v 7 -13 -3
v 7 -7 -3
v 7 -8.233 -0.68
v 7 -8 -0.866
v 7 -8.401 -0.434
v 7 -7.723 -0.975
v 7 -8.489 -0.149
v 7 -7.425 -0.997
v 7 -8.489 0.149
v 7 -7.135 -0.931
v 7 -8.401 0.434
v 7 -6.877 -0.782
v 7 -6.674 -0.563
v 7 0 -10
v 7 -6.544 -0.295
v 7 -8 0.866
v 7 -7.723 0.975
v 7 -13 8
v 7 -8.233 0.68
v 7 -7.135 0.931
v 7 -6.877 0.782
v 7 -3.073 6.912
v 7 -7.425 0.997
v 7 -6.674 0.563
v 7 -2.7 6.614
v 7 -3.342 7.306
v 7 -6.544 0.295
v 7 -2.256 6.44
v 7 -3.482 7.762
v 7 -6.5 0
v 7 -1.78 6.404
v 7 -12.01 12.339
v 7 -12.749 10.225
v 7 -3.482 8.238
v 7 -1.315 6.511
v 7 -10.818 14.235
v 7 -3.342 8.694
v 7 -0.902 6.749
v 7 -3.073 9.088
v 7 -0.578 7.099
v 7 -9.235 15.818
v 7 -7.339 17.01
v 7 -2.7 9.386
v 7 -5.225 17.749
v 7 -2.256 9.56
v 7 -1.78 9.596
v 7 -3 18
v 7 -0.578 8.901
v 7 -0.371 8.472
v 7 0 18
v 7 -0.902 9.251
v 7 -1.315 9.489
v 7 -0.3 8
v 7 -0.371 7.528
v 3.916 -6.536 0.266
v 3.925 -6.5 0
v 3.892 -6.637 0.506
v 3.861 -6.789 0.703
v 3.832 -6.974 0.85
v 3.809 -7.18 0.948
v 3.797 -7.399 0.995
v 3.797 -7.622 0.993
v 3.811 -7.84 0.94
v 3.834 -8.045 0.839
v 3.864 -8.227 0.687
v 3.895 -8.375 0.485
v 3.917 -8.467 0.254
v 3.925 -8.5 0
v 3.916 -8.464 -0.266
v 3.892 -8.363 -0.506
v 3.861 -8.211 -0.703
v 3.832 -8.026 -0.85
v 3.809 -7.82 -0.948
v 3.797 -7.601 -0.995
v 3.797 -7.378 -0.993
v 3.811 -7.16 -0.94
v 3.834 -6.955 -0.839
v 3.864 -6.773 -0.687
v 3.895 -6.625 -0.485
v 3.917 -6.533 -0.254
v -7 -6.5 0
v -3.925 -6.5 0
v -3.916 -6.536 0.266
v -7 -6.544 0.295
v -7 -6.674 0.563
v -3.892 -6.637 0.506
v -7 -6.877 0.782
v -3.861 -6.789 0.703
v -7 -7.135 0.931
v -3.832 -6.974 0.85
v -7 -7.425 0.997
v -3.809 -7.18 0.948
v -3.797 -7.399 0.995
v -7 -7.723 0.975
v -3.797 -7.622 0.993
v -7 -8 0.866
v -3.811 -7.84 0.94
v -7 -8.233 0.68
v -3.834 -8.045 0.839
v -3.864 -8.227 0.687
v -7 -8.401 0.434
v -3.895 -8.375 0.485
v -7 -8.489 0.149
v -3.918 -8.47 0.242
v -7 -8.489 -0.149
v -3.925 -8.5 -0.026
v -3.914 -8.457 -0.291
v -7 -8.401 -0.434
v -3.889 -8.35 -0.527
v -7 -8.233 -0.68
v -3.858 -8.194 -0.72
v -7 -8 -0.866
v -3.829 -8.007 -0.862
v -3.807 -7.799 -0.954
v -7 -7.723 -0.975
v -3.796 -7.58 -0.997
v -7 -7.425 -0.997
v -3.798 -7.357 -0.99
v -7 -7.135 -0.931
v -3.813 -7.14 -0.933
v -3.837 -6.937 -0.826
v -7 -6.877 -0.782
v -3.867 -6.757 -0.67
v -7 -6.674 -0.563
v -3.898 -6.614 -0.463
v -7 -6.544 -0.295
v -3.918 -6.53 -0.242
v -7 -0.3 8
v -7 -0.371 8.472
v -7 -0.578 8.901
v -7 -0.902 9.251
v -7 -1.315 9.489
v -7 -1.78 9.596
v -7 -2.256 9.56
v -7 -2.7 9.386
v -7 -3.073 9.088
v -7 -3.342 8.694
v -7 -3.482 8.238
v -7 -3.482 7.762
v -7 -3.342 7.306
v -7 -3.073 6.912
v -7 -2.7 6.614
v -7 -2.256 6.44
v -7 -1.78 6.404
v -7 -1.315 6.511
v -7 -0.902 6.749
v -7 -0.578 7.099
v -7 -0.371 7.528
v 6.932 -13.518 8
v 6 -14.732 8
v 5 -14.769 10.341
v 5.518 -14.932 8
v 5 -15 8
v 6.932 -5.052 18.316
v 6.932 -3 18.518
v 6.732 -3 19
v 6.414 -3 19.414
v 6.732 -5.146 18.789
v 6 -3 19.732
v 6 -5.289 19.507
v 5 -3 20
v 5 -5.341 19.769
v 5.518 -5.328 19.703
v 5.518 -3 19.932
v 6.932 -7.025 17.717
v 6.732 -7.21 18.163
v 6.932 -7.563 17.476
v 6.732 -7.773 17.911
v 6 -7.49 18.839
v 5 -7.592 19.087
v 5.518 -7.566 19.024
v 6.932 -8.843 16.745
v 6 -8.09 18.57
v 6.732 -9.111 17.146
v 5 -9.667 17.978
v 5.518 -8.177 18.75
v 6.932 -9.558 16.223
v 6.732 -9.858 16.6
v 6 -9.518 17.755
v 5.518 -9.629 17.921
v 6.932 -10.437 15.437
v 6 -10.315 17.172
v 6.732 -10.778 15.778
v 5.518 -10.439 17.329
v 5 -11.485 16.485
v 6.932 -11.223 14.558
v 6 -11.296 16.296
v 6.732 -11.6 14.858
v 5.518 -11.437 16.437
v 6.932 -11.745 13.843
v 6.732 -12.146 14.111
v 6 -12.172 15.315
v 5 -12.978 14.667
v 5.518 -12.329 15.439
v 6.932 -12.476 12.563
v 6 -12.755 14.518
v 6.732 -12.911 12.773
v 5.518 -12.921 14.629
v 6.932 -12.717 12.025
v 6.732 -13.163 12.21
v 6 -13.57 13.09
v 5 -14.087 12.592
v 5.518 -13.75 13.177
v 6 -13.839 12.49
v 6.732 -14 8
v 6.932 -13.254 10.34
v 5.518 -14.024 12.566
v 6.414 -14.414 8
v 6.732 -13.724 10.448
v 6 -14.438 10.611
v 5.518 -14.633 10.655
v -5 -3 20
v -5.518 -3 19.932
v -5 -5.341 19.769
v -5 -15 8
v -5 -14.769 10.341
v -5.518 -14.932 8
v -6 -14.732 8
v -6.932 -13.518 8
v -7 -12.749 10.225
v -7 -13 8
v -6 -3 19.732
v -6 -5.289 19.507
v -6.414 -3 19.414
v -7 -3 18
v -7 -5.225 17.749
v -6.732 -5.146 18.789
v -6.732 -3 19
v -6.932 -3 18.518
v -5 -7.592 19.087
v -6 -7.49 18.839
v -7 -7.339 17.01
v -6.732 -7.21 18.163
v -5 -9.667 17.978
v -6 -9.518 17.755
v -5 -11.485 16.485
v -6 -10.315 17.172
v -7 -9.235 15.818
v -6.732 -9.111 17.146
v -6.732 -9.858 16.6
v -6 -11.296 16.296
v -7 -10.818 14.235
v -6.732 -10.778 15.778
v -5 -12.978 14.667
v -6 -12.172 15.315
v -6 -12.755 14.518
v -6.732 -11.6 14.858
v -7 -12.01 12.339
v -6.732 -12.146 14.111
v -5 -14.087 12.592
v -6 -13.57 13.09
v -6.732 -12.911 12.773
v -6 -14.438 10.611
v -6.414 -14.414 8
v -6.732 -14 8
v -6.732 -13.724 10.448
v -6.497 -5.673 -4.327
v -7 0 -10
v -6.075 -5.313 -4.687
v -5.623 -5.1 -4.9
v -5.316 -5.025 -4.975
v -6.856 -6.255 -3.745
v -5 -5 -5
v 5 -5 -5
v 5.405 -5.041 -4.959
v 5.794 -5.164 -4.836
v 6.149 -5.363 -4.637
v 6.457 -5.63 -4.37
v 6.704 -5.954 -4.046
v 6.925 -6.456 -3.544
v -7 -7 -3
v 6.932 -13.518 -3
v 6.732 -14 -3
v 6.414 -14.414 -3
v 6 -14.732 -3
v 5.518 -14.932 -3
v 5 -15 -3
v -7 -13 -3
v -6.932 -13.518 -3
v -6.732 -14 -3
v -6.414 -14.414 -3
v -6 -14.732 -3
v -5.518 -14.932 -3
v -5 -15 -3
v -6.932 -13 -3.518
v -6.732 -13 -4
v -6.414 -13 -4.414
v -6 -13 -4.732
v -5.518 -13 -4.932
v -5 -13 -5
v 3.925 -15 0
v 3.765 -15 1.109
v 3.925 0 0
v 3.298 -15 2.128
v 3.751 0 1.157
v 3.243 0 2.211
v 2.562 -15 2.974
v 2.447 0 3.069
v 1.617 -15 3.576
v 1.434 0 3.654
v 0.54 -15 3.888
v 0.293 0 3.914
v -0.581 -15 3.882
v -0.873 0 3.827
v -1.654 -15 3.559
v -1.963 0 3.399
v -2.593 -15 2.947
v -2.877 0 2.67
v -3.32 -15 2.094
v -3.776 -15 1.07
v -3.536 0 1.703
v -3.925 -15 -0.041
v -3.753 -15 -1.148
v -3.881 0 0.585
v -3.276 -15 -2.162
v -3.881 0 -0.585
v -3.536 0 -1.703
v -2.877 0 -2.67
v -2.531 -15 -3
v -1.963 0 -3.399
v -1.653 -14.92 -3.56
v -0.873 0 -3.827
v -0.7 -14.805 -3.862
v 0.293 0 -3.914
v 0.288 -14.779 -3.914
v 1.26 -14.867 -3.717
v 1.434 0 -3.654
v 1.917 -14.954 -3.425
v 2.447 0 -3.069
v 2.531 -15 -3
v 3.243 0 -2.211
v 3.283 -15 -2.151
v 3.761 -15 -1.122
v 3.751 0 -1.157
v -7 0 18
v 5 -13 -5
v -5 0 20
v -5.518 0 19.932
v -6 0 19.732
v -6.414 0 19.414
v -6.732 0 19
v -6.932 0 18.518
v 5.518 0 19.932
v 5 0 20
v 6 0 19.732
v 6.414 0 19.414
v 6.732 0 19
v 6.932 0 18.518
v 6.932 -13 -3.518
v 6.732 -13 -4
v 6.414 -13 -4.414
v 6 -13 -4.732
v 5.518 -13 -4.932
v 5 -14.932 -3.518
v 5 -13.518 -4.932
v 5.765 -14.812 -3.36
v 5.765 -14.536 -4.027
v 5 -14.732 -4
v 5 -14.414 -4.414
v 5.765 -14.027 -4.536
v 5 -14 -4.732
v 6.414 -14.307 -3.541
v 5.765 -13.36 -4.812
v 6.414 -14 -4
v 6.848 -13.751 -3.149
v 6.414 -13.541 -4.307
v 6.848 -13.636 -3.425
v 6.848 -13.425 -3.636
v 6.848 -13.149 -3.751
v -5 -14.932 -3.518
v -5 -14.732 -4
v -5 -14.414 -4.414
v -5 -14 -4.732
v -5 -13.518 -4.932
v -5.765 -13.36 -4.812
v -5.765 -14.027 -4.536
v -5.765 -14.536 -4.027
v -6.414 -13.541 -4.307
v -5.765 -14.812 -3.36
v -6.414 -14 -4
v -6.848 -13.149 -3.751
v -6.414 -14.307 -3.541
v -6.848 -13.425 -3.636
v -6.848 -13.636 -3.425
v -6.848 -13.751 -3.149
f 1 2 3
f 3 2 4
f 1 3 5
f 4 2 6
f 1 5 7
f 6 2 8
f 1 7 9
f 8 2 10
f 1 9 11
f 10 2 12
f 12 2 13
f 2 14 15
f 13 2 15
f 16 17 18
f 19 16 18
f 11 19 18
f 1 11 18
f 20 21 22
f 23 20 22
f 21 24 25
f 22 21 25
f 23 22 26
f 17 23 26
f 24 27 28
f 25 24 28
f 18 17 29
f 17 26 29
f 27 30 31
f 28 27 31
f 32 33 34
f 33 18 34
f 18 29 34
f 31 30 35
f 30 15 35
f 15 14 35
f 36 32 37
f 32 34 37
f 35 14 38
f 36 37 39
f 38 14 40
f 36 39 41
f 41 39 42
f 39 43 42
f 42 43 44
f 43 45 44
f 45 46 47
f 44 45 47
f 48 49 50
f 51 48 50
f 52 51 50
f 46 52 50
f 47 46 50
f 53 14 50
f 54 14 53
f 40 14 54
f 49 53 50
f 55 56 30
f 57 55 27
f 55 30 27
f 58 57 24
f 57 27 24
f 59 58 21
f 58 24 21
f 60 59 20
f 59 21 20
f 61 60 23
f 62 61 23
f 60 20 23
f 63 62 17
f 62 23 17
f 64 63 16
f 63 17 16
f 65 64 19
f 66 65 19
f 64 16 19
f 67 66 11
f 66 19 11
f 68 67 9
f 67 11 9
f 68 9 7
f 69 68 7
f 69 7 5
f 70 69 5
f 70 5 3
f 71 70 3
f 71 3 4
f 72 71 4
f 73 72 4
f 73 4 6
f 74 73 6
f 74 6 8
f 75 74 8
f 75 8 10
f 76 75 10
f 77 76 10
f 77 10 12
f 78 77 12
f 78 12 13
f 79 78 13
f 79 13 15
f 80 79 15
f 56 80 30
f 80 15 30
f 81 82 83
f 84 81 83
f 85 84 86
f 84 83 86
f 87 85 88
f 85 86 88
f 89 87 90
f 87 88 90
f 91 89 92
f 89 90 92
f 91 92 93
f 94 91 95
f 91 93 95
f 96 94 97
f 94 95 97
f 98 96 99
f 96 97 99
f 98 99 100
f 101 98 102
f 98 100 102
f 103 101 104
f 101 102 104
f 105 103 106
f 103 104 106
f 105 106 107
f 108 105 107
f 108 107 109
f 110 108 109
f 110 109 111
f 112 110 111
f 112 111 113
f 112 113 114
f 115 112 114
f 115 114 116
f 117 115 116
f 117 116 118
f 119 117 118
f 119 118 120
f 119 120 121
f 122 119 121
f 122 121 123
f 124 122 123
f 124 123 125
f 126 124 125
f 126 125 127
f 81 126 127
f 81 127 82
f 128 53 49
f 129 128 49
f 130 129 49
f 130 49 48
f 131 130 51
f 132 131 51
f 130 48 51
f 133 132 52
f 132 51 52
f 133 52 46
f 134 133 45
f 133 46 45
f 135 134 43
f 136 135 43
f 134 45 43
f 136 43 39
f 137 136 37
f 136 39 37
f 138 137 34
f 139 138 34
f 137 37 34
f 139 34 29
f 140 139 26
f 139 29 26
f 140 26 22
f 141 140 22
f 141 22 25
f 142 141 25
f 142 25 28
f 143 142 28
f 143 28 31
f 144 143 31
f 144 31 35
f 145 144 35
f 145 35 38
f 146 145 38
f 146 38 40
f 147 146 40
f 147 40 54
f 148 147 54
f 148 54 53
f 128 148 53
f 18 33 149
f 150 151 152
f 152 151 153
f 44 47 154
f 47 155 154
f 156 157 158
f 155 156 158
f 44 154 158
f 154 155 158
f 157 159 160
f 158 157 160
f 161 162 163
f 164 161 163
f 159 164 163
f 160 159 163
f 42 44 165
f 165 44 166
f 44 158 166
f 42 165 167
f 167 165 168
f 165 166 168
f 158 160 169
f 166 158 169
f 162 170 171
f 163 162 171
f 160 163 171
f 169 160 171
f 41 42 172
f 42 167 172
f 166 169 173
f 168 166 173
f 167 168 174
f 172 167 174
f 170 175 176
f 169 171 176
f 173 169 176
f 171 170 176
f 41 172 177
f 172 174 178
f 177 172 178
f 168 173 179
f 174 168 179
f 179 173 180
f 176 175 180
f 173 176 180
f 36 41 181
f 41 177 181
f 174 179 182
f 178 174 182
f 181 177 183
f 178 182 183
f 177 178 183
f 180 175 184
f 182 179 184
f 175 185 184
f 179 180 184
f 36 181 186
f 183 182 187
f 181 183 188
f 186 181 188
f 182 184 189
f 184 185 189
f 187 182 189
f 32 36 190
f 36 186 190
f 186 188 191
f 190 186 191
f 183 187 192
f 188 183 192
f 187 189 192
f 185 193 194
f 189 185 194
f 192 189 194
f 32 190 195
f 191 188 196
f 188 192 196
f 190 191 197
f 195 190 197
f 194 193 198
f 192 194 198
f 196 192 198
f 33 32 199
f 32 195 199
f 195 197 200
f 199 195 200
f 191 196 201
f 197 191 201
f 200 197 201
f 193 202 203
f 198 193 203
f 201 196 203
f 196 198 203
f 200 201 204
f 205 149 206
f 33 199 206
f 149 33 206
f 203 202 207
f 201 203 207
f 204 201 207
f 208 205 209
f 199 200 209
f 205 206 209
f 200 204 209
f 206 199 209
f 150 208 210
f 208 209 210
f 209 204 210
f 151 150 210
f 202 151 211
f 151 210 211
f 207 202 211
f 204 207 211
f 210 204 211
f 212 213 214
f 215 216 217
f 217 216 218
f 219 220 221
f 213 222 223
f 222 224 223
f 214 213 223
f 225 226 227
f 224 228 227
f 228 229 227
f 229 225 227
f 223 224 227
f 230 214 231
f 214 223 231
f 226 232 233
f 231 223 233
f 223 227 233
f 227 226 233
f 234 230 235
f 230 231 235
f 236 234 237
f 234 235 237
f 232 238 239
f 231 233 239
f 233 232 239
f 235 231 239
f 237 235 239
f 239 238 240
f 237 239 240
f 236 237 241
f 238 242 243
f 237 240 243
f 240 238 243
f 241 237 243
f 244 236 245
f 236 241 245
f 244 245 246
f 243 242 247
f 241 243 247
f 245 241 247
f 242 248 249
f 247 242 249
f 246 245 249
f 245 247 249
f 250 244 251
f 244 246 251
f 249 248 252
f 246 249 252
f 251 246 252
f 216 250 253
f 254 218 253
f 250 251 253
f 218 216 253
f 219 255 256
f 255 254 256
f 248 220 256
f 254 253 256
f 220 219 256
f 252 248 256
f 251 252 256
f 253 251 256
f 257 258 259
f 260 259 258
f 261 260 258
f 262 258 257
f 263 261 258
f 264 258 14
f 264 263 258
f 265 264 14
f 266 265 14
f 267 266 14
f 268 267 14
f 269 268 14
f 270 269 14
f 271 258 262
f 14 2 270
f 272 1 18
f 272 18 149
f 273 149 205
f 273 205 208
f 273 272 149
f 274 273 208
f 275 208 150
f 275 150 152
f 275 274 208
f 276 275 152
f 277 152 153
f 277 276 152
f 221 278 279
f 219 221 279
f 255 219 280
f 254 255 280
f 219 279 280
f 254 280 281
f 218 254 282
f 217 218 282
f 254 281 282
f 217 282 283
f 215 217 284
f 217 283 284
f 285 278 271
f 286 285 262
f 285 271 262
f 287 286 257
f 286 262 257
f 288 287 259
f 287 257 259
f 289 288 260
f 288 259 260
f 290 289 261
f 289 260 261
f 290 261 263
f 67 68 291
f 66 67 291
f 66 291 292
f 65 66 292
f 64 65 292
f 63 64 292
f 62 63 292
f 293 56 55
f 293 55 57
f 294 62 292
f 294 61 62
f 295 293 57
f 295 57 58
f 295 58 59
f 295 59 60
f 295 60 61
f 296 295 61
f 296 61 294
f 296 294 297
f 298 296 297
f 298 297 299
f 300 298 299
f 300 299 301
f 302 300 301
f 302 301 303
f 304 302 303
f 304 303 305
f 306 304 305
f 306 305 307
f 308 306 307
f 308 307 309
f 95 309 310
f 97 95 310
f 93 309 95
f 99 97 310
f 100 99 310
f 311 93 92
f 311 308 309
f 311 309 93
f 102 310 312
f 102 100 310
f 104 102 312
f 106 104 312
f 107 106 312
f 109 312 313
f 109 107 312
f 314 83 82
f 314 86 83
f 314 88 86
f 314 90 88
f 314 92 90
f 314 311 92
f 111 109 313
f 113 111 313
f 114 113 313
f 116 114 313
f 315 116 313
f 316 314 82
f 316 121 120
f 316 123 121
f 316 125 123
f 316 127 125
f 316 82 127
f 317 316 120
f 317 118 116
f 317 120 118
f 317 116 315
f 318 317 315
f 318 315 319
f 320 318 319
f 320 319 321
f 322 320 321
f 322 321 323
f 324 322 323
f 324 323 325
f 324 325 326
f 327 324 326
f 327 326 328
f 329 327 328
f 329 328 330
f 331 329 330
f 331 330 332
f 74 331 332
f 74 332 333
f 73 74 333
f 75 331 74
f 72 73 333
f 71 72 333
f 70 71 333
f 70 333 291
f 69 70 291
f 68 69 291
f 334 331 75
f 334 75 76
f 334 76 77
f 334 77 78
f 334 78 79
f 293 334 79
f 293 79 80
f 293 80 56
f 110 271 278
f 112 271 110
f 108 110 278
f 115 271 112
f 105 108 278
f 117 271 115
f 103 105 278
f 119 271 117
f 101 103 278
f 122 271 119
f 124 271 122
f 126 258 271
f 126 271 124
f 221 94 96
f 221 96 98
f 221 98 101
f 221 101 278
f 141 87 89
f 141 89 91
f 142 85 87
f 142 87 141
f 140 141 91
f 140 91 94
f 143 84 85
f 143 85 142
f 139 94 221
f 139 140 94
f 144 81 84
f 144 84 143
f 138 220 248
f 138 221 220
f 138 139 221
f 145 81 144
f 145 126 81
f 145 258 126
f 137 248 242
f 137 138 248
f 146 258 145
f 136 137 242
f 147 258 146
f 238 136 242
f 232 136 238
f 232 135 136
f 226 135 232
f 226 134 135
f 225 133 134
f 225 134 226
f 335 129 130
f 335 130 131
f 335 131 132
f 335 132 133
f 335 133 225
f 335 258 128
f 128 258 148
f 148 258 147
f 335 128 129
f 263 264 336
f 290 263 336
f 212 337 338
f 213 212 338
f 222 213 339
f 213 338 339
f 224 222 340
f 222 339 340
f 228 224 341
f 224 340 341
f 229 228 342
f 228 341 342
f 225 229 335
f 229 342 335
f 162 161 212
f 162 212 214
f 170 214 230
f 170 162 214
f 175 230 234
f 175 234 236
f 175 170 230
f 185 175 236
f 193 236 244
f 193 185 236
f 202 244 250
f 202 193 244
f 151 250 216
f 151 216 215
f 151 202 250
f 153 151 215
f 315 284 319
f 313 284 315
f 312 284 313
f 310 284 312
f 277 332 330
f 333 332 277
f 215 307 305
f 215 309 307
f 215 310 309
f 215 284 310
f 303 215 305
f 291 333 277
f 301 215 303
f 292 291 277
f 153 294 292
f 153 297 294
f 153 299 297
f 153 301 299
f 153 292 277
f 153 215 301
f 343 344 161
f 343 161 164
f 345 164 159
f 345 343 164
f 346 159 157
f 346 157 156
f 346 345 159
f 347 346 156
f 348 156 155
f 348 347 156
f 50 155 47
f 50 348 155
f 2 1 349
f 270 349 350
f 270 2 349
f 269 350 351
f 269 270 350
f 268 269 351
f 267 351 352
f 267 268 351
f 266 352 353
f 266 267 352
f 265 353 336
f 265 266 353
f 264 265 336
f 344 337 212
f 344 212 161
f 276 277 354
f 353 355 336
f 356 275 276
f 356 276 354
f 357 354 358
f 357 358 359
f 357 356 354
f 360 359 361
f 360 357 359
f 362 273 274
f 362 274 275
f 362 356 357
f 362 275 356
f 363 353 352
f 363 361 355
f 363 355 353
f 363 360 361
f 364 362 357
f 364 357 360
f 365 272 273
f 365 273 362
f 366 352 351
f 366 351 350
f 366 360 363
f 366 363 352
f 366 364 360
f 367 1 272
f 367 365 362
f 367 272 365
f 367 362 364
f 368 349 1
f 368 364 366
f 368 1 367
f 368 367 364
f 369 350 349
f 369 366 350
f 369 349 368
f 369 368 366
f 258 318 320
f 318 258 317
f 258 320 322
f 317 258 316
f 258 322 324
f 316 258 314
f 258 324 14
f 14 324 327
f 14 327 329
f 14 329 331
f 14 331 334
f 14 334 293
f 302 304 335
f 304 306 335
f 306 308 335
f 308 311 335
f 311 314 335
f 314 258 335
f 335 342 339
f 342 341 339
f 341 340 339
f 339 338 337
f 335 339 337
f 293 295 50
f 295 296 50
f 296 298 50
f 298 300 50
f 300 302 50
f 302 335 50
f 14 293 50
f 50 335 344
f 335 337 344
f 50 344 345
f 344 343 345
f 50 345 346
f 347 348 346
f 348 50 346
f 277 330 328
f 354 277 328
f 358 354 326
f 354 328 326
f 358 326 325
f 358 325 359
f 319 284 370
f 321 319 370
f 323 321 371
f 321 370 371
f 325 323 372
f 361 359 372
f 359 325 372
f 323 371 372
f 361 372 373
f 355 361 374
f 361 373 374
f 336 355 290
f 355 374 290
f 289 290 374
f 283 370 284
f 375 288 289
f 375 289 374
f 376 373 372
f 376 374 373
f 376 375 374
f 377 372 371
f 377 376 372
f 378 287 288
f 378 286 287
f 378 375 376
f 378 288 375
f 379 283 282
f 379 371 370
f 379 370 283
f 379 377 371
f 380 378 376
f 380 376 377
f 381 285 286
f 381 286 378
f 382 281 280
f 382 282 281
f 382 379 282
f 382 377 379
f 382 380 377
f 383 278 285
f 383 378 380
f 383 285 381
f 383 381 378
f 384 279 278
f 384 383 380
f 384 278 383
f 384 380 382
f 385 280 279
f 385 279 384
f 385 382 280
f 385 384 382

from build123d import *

# Parameters (mm, degrees)
F0_W         = 14
F0_H         = 30
F0_R         = 3.925
F1_DEPTH     = 15
F3_DEPTH     = 14.001
F4_R         = 1.6
F4_R_2       = 1
F5_DEPTH     = 14.001
F6_R         = 12
F7_T1_DEPTH  = 10
F7_T3_DEPTH  = 11
F7_T5_DEPTH  = 8
F7_S9_W      = 2
F7_S9_H      = 2
F7_T10_DEPTH = 2
F7_S15_W     = 2
F7_S15_H     = 2
F7_T16_DEPTH = 2
F7_T22_DEPTH = 13
F7_T25_ANGLE = 90
F7_T29_DEPTH = 13
F7_T32_ANGLE = 90


# Not quite as in the source:
# - a fillet or chamfer that OpenCascade refuses, or shapes differently, is made with other operations: its cross-section is extruded or revolved along the edge and cut away or added


with BuildPart() as f1:
    # F0 (on Front) → F1 (new body)
    with BuildSketch(Plane.XZ):
        with Locations((0, 5)):
            Rectangle(F0_W, F0_H)
        Circle(F0_R, mode=Mode.SUBTRACT)
    extrude(amount=F1_DEPTH)

    # F2 (on face) → F3 (cut, through all)
    with BuildSketch(Plane.YZ.offset(7)):
        Polygon((-15, -10), (0, -10), (-5, -5), (-15, -5), align=None)
    extrude(amount=-F3_DEPTH, mode=Mode.SUBTRACT)

    # F4 (on face) → F5 (cut, through all)
    with BuildSketch(Plane.YZ.offset(7)):
        with Locations((-1.9, 8)):
            Circle(F4_R)
        with Locations((-7.5, 0)):
            Circle(F4_R_2)
    extrude(amount=-F5_DEPTH, mode=Mode.SUBTRACT)

    # F6
    f6_edges = [f1.edges().sort_by_distance(p)[0] for p in [
        (0, -15, 20),
    ]]
    fillet(f6_edges, radius=F6_R)

    # F7: fillet of radius 2 on 9 edges, made by hand

    # F7_s2 → F7_t1 (cut)
    with BuildSketch(Plane.YZ.offset(-5)):
        with BuildLine():
            ThreePointArc((-15, -3), (-14.4142135624, -4.4142135624), (-13, -5))
            Line((-13, -5), (-15, -5))
            Line((-15, -5), (-15, -3))
        make_face()
    extrude(amount=F7_T1_DEPTH, mode=Mode.SUBTRACT)

    # F7_s4 → F7_t3 (cut)
    with BuildSketch(Plane.XY.offset(-3)):
        with BuildLine():
            ThreePointArc((7, -13), (6.4142135624, -14.4142135624), (5, -15))
            Line((5, -15), (7, -15))
            Line((7, -15), (7, -13))
        make_face()
        with BuildLine():
            ThreePointArc((-7, -13), (-6.4142135624, -14.4142135624), (-5, -15))
            Line((-5, -15), (-7, -15))
            Line((-7, -15), (-7, -13))
        make_face()
    extrude(amount=F7_T3_DEPTH, mode=Mode.SUBTRACT)

    # F7_s6 → F7_t5 (cut)
    with BuildSketch(Plane.XZ.offset(-5)):
        with BuildLine():
            ThreePointArc((5, 20), (6.4142135624, 19.4142135624), (7, 18))
            Line((7, 18), (7, 20))
            Line((7, 20), (5, 20))
        make_face()
        with BuildLine():
            ThreePointArc((-5, 20), (-6.4142135624, 19.4142135624), (-7, 18))
            Line((-7, 18), (-7, 20))
            Line((-7, 20), (-5, 20))
        make_face()
    extrude(amount=F7_T5_DEPTH, mode=Mode.SUBTRACT)


with BuildPart() as f7_tool8:
    # F7_s9 → F7_t10 (new body)
    with BuildSketch(Plane.YZ.offset(5)):
        with Locations((-14, -4)):
            Rectangle(F7_S9_W, F7_S9_H)
    extrude(amount=F7_T10_DEPTH)

    # F7_s11 → F7_t12 (revolve, cut)
    with BuildSketch(Plane(origin=(5, -13, -3), x_dir=(0, 0.7071067812, 0.7071067812), z_dir=(0, 0.7071067812, -0.7071067812))):
        with BuildLine():
            ThreePointArc((0, -2), (2, 0), (0, 2))
            Line((0, 2), (0, -2))
        make_face()
    revolve(axis=Axis((5, -13, -3), (1, 0, 0)), mode=Mode.SUBTRACT)


with BuildPart() as f1_1:
    add(f1.part)

    # F7_t7: cut F7_tool8
    add(f7_tool8.part, mode=Mode.SUBTRACT)


with BuildPart() as f7_tool14:
    # F7_s15 → F7_t16 (new body)
    with BuildSketch(Plane.YZ.offset(-5)):
        with Locations((-14, -4)):
            Rectangle(F7_S15_W, F7_S15_H)
    extrude(amount=-F7_T16_DEPTH)

    # F7_s17 → F7_t18 (revolve, cut)
    with BuildSketch(Plane(origin=(-5, -13, -3), x_dir=(0, 0.7071067812, 0.7071067812), z_dir=(0, -0.7071067812, 0.7071067812))):
        with BuildLine():
            ThreePointArc((0, -2), (2, 0), (0, 2))
            Line((0, 2), (0, -2))
        make_face()
    revolve(axis=Axis((-5, -13, -3), (-1, 0, 0)), mode=Mode.SUBTRACT)


with BuildPart() as f1_2:
    add(f1_1.part)

    # F7_t13: cut F7_tool14
    add(f7_tool14.part, mode=Mode.SUBTRACT)


with BuildPart() as f7_tool20:
    # F7_s21 → F7_t22 (new body)
    with BuildSketch(Plane.XZ):
        with BuildLine():
            ThreePointArc((-7, -3), (-6.4142135624, -4.4142135624), (-5, -5))
            Line((-5, -5), (-7, -5))
            Line((-7, -5), (-7, -3))
        make_face()
    extrude(amount=F7_T22_DEPTH)

    split(bisect_by=Plane(origin=(0, -5, -5), x_dir=(1, 0, 0), z_dir=(0, -0.7071067812, -0.7071067812)), keep=Keep.TOP)


with BuildPart() as f1_3:
    add(f1_2.part)

    # F7_t19: cut F7_tool20
    add(f7_tool20.part, mode=Mode.SUBTRACT)

    # F7_s24 → F7_t25 (revolve, cut)
    with BuildSketch(Plane.XZ.offset(3)):
        with BuildLine():
            ThreePointArc((-5, 20), (-6.4142135624, 19.4142135624), (-7, 18))
            Line((-7, 18), (-7, 20))
            Line((-7, 20), (-5, 20))
        make_face()
    revolve(axis=Axis((-7, -3, 8), (1, 0, 0)), revolution_arc=F7_T25_ANGLE, mode=Mode.SUBTRACT)


with BuildPart() as f7_tool27:
    # F7_s28 → F7_t29 (new body)
    with BuildSketch(Plane.XZ):
        with BuildLine():
            ThreePointArc((7, -3), (6.4142135624, -4.4142135624), (5, -5))
            Line((5, -5), (7, -5))
            Line((7, -5), (7, -3))
        make_face()
    extrude(amount=F7_T29_DEPTH)

    split(bisect_by=Plane(origin=(0, -5, -5), x_dir=(1, 0, 0), z_dir=(0, -0.7071067812, -0.7071067812)), keep=Keep.TOP)


with BuildPart() as f1_4:
    add(f1_3.part)

    # F7_t26: cut F7_tool27
    add(f7_tool27.part, mode=Mode.SUBTRACT)

    # F7_s31 → F7_t32 (revolve, cut)
    with BuildSketch(Plane.XZ.offset(3)):
        with BuildLine():
            ThreePointArc((7, 18), (6.4142135624, 19.4142135624), (5, 20))
            Line((5, 20), (7, 20))
            Line((7, 20), (7, 18))
        make_face()
    revolve(axis=Axis((7, -3, 8), (1, 0, 0)), revolution_arc=F7_T32_ANGLE, mode=Mode.SUBTRACT)


solid = f1_4.part
